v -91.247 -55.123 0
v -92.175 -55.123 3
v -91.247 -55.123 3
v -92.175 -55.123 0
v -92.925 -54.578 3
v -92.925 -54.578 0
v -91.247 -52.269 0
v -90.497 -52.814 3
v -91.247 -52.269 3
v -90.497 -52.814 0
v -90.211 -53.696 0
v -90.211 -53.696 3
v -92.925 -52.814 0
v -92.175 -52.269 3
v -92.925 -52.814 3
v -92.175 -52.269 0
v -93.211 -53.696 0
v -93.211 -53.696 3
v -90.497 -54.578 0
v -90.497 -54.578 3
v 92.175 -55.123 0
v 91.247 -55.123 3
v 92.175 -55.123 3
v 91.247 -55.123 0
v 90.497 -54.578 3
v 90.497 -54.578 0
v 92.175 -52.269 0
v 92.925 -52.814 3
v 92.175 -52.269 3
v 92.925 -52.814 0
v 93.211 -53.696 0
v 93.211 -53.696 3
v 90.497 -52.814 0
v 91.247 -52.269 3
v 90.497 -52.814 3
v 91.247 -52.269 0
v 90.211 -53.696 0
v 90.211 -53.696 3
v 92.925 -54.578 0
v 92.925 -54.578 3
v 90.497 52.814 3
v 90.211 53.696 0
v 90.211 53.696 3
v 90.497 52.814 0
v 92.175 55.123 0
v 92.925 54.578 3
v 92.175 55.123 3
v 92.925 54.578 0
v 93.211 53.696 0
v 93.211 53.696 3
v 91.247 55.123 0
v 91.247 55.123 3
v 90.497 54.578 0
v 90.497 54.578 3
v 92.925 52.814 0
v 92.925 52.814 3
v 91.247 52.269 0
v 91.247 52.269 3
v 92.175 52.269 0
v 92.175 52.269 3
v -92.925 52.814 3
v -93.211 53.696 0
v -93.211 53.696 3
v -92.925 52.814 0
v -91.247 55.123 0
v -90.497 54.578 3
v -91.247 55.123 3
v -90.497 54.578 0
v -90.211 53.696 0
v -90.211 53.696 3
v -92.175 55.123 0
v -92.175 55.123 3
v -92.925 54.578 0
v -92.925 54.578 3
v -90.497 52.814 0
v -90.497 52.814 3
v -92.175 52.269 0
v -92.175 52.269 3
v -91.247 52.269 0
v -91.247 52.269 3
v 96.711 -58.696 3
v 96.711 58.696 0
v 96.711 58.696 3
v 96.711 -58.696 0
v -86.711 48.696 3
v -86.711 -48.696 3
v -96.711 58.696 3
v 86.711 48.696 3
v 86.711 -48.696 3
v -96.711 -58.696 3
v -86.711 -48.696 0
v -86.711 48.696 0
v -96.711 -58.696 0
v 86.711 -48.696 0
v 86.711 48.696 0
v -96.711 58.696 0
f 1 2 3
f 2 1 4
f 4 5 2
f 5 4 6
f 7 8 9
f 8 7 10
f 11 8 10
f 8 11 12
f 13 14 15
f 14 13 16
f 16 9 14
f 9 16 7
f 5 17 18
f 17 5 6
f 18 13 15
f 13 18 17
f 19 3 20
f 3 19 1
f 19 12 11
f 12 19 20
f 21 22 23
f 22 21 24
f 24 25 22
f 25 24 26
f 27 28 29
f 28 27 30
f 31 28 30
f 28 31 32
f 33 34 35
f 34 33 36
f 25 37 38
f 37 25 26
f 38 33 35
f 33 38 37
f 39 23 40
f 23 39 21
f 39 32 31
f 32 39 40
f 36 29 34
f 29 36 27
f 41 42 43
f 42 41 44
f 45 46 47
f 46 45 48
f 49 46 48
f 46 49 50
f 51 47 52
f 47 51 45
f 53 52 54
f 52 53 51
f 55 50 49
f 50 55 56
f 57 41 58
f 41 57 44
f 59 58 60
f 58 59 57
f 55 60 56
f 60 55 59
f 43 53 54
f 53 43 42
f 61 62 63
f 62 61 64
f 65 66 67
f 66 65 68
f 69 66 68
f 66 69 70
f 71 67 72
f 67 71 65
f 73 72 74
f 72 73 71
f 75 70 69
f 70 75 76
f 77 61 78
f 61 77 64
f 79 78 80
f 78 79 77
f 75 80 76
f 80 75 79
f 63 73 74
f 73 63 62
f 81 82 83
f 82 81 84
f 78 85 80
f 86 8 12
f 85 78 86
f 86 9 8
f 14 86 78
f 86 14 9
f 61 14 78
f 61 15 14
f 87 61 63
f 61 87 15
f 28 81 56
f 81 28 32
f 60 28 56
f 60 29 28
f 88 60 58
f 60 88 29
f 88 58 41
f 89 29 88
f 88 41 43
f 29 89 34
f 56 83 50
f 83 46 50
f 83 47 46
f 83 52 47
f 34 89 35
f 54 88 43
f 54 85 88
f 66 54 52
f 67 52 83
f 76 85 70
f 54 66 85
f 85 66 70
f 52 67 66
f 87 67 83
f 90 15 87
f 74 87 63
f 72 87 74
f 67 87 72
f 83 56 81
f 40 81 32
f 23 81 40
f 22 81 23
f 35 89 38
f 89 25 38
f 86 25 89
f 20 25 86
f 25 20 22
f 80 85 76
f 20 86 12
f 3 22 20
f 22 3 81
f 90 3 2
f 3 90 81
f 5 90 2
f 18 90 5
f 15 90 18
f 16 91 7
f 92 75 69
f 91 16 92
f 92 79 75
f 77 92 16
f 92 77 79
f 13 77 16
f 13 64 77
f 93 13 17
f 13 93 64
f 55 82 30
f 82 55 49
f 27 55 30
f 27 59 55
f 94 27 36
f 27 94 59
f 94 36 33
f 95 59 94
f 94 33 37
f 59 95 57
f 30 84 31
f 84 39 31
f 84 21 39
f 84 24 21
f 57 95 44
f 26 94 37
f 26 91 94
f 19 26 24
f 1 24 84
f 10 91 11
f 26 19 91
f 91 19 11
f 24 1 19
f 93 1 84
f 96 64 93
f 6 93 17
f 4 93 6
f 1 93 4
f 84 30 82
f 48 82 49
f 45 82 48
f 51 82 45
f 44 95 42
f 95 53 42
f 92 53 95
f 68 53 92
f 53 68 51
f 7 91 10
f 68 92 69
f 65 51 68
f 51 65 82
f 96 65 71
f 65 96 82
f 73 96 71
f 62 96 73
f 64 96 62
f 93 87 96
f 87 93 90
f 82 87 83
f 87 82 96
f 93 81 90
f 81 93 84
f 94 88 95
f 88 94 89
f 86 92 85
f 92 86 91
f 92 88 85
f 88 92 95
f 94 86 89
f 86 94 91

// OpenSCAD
// file: negative_screw.scad
use <dimensions.scad>

thickness = 3;
module negative_screw() {
    translate([-plate_width()/2 + hole_offset(), -plate_height()/2 + hole_offset(), 0])
        cylinder(h = thickness * 2, r = hole_radius(), center=true);
    translate([plate_width()/2 - hole_offset(), -plate_height()/2 + hole_offset(), 0])
        cylinder(h = thickness * 2, r = hole_radius(), center=true);
    translate([plate_width()/2 - hole_offset(), plate_height()/2 - hole_offset(), 0])
        cylinder(h = thickness * 2, r = hole_radius(), center=true);
    translate([-plate_width()/2 + hole_offset(), plate_height()/2 - hole_offset(), 0])
        cylinder(h = thickness * 2, r = hole_radius(), center=true);
}

negative_screw();
// file: dimensions.scad
function plate_width() = 193.422;
function plate_height() = 117.392;
function plate_thickness() = 3;
function separation() = 5;
function led_width() = 10;
function led_height() = 2.5;
function hole_radius() = 1.5;
function hole_offset() = 3.5 + hole_radius();
function separator_thickness() = (led_width()-plate_thickness())/2;

function electronics_width() = 81.3;
function electronics_height() = 50.7;
function electronics_thickness() = 23;
// main file
use <dimensions.scad>
use <negative_screw.scad>

image_offset = 10;
$fs = 1;
$fa = 0.4;

module image_plate() {
    translate([0, 0, plate_thickness()/2])
    difference() {
        cube([plate_width(), plate_height(), plate_thickness()], center=true);
        negative_screw();
        cube([plate_width()-image_offset*2, plate_height()-image_offset*2, plate_thickness()*2], center=true);
    }
}

image_plate();
